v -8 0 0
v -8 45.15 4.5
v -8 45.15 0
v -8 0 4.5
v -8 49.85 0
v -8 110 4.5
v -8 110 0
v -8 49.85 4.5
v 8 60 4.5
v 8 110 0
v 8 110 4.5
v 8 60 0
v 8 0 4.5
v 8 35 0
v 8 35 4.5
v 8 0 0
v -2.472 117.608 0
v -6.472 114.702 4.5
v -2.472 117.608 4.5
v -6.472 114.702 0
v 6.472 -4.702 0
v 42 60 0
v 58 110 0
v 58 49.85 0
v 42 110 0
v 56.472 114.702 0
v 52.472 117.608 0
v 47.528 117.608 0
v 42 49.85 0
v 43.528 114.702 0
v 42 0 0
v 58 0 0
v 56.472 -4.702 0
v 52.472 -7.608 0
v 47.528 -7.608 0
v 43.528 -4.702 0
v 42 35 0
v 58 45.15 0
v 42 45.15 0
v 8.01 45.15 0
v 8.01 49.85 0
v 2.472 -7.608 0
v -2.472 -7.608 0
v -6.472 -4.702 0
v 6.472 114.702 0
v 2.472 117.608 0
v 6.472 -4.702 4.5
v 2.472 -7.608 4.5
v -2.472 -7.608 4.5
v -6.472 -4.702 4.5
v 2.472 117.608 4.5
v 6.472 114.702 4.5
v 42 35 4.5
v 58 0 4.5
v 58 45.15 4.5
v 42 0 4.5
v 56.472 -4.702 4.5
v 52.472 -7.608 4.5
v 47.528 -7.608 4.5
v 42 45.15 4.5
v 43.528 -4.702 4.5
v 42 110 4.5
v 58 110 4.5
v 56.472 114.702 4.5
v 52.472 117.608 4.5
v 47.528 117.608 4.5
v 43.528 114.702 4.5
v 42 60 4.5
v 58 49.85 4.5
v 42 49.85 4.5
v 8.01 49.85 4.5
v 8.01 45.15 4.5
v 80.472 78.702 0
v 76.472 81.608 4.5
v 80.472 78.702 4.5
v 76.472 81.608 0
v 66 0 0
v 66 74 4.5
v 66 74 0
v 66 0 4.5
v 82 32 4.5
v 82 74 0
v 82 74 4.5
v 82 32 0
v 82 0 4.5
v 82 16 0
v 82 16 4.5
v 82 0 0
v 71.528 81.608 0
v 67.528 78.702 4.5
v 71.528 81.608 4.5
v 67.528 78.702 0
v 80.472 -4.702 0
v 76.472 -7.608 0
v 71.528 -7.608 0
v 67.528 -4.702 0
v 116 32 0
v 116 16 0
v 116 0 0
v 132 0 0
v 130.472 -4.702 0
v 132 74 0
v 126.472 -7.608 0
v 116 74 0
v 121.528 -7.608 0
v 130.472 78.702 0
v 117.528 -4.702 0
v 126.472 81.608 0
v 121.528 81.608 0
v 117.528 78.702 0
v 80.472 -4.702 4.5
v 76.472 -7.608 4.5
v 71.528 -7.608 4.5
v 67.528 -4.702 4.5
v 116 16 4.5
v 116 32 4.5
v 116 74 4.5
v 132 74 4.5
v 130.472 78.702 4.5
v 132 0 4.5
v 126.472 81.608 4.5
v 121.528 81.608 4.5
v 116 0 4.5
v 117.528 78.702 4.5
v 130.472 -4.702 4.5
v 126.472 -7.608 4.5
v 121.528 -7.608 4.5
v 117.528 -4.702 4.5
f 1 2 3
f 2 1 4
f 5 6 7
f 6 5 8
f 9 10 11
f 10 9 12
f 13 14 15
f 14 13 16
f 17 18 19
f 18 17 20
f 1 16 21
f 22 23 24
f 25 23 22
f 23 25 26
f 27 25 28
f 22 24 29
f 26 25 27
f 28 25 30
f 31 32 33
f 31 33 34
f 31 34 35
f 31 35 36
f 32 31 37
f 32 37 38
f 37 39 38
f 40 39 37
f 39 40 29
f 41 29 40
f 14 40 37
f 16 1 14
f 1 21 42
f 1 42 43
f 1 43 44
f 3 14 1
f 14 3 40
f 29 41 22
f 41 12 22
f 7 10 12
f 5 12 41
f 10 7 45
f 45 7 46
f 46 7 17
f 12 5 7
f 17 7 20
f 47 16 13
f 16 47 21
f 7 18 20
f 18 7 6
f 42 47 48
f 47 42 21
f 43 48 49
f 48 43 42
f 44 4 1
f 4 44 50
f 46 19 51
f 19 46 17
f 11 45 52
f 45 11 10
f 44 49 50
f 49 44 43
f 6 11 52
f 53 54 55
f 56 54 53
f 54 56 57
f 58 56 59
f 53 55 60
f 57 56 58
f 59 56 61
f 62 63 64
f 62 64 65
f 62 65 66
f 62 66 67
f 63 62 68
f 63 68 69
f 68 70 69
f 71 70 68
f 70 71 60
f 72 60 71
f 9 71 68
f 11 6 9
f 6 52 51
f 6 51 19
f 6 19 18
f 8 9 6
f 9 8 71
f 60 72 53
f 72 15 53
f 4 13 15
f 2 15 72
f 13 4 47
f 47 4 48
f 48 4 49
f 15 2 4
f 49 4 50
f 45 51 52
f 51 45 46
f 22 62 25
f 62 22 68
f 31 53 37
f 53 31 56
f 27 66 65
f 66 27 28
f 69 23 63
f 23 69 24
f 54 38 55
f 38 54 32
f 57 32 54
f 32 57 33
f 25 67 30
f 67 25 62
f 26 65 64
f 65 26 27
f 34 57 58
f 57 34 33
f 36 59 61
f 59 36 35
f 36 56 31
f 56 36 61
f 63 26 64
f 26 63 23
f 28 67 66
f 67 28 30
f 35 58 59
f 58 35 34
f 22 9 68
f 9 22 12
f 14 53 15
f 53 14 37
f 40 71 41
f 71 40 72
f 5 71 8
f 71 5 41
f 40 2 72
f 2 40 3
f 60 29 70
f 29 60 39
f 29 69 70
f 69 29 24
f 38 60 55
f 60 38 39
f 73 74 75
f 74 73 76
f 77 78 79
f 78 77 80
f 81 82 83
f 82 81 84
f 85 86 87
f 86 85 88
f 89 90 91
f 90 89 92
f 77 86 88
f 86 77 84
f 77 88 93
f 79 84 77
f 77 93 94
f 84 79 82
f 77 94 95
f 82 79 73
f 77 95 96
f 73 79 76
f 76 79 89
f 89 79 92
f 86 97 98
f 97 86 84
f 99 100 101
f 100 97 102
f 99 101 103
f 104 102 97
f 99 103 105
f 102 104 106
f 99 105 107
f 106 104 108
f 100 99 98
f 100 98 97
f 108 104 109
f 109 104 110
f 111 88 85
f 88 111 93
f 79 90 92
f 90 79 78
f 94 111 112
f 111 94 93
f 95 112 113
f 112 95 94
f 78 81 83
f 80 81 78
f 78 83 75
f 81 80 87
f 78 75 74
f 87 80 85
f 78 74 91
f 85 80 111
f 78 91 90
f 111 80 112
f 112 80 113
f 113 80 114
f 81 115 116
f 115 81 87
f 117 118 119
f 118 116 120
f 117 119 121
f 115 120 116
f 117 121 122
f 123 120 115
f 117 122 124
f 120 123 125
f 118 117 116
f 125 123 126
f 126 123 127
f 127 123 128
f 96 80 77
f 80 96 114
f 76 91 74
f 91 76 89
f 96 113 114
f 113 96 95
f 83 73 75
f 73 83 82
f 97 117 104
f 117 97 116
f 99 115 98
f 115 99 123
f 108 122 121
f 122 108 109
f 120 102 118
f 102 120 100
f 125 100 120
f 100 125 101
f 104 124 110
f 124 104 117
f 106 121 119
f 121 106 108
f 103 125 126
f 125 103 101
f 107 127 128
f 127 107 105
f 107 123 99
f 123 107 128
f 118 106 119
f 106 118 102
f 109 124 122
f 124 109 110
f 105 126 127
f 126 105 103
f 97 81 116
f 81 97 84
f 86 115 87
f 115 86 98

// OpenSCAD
mainLongArm= 126;
mainLowerLeg= 35;
mainCentreBar= 25;

ArmWidth = 16;
StandWidth= 66; 

supportLongArm= 90;
supportCentreBar= ArmWidth;
supportForPhone= 25;

Z= 4.5;

//Advanced
play = .2; // slack allowance to push fit the 2 pats
$fn=10; // Puts a flat on the bottom of main stand, use higher numbers for a smoother radius

difference(){
  union(){
     hull(){
       cylinder(d=ArmWidth, Z);
       translate([0, mainLongArm-ArmWidth, 0]) cylinder(d=ArmWidth, Z);
    }
    translate([StandWidth-ArmWidth, 0, 0]) hull(){
       cylinder(d=ArmWidth, Z);
       translate([0, mainLongArm-ArmWidth, 0]) cylinder(d=ArmWidth, Z);
    }
    translate([ArmWidth/2, mainLowerLeg, 0]) cube([StandWidth-ArmWidth-ArmWidth, mainCentreBar, Z]); 
  }
  translate([-ArmWidth/2, mainLowerLeg+(mainCentreBar-Z-play)/2, -.01]) cube([ArmWidth+.01, Z+play, Z+.02]);
  translate([StandWidth-ArmWidth-ArmWidth/2, mainLowerLeg+(mainCentreBar-Z-play)/2, -.01]) cube([ArmWidth+.01, Z+play, Z+.02]);
}

translate([StandWidth-ArmWidth+3/2*ArmWidth, 0, 0])
  union(){
     hull(){
       cylinder(d=ArmWidth, Z);
       translate([0, supportLongArm-ArmWidth, 0]) cylinder(d=ArmWidth, Z);
    }
    translate([StandWidth-ArmWidth, 0, 0]) hull(){
       cylinder(d=ArmWidth, Z);
       translate([0, supportLongArm-ArmWidth, 0]) cylinder(d=ArmWidth, Z);
    }
    translate([ArmWidth/2, supportCentreBar, 0]) cube([StandWidth-ArmWidth-ArmWidth, supportCentreBar, Z]); 
  }
